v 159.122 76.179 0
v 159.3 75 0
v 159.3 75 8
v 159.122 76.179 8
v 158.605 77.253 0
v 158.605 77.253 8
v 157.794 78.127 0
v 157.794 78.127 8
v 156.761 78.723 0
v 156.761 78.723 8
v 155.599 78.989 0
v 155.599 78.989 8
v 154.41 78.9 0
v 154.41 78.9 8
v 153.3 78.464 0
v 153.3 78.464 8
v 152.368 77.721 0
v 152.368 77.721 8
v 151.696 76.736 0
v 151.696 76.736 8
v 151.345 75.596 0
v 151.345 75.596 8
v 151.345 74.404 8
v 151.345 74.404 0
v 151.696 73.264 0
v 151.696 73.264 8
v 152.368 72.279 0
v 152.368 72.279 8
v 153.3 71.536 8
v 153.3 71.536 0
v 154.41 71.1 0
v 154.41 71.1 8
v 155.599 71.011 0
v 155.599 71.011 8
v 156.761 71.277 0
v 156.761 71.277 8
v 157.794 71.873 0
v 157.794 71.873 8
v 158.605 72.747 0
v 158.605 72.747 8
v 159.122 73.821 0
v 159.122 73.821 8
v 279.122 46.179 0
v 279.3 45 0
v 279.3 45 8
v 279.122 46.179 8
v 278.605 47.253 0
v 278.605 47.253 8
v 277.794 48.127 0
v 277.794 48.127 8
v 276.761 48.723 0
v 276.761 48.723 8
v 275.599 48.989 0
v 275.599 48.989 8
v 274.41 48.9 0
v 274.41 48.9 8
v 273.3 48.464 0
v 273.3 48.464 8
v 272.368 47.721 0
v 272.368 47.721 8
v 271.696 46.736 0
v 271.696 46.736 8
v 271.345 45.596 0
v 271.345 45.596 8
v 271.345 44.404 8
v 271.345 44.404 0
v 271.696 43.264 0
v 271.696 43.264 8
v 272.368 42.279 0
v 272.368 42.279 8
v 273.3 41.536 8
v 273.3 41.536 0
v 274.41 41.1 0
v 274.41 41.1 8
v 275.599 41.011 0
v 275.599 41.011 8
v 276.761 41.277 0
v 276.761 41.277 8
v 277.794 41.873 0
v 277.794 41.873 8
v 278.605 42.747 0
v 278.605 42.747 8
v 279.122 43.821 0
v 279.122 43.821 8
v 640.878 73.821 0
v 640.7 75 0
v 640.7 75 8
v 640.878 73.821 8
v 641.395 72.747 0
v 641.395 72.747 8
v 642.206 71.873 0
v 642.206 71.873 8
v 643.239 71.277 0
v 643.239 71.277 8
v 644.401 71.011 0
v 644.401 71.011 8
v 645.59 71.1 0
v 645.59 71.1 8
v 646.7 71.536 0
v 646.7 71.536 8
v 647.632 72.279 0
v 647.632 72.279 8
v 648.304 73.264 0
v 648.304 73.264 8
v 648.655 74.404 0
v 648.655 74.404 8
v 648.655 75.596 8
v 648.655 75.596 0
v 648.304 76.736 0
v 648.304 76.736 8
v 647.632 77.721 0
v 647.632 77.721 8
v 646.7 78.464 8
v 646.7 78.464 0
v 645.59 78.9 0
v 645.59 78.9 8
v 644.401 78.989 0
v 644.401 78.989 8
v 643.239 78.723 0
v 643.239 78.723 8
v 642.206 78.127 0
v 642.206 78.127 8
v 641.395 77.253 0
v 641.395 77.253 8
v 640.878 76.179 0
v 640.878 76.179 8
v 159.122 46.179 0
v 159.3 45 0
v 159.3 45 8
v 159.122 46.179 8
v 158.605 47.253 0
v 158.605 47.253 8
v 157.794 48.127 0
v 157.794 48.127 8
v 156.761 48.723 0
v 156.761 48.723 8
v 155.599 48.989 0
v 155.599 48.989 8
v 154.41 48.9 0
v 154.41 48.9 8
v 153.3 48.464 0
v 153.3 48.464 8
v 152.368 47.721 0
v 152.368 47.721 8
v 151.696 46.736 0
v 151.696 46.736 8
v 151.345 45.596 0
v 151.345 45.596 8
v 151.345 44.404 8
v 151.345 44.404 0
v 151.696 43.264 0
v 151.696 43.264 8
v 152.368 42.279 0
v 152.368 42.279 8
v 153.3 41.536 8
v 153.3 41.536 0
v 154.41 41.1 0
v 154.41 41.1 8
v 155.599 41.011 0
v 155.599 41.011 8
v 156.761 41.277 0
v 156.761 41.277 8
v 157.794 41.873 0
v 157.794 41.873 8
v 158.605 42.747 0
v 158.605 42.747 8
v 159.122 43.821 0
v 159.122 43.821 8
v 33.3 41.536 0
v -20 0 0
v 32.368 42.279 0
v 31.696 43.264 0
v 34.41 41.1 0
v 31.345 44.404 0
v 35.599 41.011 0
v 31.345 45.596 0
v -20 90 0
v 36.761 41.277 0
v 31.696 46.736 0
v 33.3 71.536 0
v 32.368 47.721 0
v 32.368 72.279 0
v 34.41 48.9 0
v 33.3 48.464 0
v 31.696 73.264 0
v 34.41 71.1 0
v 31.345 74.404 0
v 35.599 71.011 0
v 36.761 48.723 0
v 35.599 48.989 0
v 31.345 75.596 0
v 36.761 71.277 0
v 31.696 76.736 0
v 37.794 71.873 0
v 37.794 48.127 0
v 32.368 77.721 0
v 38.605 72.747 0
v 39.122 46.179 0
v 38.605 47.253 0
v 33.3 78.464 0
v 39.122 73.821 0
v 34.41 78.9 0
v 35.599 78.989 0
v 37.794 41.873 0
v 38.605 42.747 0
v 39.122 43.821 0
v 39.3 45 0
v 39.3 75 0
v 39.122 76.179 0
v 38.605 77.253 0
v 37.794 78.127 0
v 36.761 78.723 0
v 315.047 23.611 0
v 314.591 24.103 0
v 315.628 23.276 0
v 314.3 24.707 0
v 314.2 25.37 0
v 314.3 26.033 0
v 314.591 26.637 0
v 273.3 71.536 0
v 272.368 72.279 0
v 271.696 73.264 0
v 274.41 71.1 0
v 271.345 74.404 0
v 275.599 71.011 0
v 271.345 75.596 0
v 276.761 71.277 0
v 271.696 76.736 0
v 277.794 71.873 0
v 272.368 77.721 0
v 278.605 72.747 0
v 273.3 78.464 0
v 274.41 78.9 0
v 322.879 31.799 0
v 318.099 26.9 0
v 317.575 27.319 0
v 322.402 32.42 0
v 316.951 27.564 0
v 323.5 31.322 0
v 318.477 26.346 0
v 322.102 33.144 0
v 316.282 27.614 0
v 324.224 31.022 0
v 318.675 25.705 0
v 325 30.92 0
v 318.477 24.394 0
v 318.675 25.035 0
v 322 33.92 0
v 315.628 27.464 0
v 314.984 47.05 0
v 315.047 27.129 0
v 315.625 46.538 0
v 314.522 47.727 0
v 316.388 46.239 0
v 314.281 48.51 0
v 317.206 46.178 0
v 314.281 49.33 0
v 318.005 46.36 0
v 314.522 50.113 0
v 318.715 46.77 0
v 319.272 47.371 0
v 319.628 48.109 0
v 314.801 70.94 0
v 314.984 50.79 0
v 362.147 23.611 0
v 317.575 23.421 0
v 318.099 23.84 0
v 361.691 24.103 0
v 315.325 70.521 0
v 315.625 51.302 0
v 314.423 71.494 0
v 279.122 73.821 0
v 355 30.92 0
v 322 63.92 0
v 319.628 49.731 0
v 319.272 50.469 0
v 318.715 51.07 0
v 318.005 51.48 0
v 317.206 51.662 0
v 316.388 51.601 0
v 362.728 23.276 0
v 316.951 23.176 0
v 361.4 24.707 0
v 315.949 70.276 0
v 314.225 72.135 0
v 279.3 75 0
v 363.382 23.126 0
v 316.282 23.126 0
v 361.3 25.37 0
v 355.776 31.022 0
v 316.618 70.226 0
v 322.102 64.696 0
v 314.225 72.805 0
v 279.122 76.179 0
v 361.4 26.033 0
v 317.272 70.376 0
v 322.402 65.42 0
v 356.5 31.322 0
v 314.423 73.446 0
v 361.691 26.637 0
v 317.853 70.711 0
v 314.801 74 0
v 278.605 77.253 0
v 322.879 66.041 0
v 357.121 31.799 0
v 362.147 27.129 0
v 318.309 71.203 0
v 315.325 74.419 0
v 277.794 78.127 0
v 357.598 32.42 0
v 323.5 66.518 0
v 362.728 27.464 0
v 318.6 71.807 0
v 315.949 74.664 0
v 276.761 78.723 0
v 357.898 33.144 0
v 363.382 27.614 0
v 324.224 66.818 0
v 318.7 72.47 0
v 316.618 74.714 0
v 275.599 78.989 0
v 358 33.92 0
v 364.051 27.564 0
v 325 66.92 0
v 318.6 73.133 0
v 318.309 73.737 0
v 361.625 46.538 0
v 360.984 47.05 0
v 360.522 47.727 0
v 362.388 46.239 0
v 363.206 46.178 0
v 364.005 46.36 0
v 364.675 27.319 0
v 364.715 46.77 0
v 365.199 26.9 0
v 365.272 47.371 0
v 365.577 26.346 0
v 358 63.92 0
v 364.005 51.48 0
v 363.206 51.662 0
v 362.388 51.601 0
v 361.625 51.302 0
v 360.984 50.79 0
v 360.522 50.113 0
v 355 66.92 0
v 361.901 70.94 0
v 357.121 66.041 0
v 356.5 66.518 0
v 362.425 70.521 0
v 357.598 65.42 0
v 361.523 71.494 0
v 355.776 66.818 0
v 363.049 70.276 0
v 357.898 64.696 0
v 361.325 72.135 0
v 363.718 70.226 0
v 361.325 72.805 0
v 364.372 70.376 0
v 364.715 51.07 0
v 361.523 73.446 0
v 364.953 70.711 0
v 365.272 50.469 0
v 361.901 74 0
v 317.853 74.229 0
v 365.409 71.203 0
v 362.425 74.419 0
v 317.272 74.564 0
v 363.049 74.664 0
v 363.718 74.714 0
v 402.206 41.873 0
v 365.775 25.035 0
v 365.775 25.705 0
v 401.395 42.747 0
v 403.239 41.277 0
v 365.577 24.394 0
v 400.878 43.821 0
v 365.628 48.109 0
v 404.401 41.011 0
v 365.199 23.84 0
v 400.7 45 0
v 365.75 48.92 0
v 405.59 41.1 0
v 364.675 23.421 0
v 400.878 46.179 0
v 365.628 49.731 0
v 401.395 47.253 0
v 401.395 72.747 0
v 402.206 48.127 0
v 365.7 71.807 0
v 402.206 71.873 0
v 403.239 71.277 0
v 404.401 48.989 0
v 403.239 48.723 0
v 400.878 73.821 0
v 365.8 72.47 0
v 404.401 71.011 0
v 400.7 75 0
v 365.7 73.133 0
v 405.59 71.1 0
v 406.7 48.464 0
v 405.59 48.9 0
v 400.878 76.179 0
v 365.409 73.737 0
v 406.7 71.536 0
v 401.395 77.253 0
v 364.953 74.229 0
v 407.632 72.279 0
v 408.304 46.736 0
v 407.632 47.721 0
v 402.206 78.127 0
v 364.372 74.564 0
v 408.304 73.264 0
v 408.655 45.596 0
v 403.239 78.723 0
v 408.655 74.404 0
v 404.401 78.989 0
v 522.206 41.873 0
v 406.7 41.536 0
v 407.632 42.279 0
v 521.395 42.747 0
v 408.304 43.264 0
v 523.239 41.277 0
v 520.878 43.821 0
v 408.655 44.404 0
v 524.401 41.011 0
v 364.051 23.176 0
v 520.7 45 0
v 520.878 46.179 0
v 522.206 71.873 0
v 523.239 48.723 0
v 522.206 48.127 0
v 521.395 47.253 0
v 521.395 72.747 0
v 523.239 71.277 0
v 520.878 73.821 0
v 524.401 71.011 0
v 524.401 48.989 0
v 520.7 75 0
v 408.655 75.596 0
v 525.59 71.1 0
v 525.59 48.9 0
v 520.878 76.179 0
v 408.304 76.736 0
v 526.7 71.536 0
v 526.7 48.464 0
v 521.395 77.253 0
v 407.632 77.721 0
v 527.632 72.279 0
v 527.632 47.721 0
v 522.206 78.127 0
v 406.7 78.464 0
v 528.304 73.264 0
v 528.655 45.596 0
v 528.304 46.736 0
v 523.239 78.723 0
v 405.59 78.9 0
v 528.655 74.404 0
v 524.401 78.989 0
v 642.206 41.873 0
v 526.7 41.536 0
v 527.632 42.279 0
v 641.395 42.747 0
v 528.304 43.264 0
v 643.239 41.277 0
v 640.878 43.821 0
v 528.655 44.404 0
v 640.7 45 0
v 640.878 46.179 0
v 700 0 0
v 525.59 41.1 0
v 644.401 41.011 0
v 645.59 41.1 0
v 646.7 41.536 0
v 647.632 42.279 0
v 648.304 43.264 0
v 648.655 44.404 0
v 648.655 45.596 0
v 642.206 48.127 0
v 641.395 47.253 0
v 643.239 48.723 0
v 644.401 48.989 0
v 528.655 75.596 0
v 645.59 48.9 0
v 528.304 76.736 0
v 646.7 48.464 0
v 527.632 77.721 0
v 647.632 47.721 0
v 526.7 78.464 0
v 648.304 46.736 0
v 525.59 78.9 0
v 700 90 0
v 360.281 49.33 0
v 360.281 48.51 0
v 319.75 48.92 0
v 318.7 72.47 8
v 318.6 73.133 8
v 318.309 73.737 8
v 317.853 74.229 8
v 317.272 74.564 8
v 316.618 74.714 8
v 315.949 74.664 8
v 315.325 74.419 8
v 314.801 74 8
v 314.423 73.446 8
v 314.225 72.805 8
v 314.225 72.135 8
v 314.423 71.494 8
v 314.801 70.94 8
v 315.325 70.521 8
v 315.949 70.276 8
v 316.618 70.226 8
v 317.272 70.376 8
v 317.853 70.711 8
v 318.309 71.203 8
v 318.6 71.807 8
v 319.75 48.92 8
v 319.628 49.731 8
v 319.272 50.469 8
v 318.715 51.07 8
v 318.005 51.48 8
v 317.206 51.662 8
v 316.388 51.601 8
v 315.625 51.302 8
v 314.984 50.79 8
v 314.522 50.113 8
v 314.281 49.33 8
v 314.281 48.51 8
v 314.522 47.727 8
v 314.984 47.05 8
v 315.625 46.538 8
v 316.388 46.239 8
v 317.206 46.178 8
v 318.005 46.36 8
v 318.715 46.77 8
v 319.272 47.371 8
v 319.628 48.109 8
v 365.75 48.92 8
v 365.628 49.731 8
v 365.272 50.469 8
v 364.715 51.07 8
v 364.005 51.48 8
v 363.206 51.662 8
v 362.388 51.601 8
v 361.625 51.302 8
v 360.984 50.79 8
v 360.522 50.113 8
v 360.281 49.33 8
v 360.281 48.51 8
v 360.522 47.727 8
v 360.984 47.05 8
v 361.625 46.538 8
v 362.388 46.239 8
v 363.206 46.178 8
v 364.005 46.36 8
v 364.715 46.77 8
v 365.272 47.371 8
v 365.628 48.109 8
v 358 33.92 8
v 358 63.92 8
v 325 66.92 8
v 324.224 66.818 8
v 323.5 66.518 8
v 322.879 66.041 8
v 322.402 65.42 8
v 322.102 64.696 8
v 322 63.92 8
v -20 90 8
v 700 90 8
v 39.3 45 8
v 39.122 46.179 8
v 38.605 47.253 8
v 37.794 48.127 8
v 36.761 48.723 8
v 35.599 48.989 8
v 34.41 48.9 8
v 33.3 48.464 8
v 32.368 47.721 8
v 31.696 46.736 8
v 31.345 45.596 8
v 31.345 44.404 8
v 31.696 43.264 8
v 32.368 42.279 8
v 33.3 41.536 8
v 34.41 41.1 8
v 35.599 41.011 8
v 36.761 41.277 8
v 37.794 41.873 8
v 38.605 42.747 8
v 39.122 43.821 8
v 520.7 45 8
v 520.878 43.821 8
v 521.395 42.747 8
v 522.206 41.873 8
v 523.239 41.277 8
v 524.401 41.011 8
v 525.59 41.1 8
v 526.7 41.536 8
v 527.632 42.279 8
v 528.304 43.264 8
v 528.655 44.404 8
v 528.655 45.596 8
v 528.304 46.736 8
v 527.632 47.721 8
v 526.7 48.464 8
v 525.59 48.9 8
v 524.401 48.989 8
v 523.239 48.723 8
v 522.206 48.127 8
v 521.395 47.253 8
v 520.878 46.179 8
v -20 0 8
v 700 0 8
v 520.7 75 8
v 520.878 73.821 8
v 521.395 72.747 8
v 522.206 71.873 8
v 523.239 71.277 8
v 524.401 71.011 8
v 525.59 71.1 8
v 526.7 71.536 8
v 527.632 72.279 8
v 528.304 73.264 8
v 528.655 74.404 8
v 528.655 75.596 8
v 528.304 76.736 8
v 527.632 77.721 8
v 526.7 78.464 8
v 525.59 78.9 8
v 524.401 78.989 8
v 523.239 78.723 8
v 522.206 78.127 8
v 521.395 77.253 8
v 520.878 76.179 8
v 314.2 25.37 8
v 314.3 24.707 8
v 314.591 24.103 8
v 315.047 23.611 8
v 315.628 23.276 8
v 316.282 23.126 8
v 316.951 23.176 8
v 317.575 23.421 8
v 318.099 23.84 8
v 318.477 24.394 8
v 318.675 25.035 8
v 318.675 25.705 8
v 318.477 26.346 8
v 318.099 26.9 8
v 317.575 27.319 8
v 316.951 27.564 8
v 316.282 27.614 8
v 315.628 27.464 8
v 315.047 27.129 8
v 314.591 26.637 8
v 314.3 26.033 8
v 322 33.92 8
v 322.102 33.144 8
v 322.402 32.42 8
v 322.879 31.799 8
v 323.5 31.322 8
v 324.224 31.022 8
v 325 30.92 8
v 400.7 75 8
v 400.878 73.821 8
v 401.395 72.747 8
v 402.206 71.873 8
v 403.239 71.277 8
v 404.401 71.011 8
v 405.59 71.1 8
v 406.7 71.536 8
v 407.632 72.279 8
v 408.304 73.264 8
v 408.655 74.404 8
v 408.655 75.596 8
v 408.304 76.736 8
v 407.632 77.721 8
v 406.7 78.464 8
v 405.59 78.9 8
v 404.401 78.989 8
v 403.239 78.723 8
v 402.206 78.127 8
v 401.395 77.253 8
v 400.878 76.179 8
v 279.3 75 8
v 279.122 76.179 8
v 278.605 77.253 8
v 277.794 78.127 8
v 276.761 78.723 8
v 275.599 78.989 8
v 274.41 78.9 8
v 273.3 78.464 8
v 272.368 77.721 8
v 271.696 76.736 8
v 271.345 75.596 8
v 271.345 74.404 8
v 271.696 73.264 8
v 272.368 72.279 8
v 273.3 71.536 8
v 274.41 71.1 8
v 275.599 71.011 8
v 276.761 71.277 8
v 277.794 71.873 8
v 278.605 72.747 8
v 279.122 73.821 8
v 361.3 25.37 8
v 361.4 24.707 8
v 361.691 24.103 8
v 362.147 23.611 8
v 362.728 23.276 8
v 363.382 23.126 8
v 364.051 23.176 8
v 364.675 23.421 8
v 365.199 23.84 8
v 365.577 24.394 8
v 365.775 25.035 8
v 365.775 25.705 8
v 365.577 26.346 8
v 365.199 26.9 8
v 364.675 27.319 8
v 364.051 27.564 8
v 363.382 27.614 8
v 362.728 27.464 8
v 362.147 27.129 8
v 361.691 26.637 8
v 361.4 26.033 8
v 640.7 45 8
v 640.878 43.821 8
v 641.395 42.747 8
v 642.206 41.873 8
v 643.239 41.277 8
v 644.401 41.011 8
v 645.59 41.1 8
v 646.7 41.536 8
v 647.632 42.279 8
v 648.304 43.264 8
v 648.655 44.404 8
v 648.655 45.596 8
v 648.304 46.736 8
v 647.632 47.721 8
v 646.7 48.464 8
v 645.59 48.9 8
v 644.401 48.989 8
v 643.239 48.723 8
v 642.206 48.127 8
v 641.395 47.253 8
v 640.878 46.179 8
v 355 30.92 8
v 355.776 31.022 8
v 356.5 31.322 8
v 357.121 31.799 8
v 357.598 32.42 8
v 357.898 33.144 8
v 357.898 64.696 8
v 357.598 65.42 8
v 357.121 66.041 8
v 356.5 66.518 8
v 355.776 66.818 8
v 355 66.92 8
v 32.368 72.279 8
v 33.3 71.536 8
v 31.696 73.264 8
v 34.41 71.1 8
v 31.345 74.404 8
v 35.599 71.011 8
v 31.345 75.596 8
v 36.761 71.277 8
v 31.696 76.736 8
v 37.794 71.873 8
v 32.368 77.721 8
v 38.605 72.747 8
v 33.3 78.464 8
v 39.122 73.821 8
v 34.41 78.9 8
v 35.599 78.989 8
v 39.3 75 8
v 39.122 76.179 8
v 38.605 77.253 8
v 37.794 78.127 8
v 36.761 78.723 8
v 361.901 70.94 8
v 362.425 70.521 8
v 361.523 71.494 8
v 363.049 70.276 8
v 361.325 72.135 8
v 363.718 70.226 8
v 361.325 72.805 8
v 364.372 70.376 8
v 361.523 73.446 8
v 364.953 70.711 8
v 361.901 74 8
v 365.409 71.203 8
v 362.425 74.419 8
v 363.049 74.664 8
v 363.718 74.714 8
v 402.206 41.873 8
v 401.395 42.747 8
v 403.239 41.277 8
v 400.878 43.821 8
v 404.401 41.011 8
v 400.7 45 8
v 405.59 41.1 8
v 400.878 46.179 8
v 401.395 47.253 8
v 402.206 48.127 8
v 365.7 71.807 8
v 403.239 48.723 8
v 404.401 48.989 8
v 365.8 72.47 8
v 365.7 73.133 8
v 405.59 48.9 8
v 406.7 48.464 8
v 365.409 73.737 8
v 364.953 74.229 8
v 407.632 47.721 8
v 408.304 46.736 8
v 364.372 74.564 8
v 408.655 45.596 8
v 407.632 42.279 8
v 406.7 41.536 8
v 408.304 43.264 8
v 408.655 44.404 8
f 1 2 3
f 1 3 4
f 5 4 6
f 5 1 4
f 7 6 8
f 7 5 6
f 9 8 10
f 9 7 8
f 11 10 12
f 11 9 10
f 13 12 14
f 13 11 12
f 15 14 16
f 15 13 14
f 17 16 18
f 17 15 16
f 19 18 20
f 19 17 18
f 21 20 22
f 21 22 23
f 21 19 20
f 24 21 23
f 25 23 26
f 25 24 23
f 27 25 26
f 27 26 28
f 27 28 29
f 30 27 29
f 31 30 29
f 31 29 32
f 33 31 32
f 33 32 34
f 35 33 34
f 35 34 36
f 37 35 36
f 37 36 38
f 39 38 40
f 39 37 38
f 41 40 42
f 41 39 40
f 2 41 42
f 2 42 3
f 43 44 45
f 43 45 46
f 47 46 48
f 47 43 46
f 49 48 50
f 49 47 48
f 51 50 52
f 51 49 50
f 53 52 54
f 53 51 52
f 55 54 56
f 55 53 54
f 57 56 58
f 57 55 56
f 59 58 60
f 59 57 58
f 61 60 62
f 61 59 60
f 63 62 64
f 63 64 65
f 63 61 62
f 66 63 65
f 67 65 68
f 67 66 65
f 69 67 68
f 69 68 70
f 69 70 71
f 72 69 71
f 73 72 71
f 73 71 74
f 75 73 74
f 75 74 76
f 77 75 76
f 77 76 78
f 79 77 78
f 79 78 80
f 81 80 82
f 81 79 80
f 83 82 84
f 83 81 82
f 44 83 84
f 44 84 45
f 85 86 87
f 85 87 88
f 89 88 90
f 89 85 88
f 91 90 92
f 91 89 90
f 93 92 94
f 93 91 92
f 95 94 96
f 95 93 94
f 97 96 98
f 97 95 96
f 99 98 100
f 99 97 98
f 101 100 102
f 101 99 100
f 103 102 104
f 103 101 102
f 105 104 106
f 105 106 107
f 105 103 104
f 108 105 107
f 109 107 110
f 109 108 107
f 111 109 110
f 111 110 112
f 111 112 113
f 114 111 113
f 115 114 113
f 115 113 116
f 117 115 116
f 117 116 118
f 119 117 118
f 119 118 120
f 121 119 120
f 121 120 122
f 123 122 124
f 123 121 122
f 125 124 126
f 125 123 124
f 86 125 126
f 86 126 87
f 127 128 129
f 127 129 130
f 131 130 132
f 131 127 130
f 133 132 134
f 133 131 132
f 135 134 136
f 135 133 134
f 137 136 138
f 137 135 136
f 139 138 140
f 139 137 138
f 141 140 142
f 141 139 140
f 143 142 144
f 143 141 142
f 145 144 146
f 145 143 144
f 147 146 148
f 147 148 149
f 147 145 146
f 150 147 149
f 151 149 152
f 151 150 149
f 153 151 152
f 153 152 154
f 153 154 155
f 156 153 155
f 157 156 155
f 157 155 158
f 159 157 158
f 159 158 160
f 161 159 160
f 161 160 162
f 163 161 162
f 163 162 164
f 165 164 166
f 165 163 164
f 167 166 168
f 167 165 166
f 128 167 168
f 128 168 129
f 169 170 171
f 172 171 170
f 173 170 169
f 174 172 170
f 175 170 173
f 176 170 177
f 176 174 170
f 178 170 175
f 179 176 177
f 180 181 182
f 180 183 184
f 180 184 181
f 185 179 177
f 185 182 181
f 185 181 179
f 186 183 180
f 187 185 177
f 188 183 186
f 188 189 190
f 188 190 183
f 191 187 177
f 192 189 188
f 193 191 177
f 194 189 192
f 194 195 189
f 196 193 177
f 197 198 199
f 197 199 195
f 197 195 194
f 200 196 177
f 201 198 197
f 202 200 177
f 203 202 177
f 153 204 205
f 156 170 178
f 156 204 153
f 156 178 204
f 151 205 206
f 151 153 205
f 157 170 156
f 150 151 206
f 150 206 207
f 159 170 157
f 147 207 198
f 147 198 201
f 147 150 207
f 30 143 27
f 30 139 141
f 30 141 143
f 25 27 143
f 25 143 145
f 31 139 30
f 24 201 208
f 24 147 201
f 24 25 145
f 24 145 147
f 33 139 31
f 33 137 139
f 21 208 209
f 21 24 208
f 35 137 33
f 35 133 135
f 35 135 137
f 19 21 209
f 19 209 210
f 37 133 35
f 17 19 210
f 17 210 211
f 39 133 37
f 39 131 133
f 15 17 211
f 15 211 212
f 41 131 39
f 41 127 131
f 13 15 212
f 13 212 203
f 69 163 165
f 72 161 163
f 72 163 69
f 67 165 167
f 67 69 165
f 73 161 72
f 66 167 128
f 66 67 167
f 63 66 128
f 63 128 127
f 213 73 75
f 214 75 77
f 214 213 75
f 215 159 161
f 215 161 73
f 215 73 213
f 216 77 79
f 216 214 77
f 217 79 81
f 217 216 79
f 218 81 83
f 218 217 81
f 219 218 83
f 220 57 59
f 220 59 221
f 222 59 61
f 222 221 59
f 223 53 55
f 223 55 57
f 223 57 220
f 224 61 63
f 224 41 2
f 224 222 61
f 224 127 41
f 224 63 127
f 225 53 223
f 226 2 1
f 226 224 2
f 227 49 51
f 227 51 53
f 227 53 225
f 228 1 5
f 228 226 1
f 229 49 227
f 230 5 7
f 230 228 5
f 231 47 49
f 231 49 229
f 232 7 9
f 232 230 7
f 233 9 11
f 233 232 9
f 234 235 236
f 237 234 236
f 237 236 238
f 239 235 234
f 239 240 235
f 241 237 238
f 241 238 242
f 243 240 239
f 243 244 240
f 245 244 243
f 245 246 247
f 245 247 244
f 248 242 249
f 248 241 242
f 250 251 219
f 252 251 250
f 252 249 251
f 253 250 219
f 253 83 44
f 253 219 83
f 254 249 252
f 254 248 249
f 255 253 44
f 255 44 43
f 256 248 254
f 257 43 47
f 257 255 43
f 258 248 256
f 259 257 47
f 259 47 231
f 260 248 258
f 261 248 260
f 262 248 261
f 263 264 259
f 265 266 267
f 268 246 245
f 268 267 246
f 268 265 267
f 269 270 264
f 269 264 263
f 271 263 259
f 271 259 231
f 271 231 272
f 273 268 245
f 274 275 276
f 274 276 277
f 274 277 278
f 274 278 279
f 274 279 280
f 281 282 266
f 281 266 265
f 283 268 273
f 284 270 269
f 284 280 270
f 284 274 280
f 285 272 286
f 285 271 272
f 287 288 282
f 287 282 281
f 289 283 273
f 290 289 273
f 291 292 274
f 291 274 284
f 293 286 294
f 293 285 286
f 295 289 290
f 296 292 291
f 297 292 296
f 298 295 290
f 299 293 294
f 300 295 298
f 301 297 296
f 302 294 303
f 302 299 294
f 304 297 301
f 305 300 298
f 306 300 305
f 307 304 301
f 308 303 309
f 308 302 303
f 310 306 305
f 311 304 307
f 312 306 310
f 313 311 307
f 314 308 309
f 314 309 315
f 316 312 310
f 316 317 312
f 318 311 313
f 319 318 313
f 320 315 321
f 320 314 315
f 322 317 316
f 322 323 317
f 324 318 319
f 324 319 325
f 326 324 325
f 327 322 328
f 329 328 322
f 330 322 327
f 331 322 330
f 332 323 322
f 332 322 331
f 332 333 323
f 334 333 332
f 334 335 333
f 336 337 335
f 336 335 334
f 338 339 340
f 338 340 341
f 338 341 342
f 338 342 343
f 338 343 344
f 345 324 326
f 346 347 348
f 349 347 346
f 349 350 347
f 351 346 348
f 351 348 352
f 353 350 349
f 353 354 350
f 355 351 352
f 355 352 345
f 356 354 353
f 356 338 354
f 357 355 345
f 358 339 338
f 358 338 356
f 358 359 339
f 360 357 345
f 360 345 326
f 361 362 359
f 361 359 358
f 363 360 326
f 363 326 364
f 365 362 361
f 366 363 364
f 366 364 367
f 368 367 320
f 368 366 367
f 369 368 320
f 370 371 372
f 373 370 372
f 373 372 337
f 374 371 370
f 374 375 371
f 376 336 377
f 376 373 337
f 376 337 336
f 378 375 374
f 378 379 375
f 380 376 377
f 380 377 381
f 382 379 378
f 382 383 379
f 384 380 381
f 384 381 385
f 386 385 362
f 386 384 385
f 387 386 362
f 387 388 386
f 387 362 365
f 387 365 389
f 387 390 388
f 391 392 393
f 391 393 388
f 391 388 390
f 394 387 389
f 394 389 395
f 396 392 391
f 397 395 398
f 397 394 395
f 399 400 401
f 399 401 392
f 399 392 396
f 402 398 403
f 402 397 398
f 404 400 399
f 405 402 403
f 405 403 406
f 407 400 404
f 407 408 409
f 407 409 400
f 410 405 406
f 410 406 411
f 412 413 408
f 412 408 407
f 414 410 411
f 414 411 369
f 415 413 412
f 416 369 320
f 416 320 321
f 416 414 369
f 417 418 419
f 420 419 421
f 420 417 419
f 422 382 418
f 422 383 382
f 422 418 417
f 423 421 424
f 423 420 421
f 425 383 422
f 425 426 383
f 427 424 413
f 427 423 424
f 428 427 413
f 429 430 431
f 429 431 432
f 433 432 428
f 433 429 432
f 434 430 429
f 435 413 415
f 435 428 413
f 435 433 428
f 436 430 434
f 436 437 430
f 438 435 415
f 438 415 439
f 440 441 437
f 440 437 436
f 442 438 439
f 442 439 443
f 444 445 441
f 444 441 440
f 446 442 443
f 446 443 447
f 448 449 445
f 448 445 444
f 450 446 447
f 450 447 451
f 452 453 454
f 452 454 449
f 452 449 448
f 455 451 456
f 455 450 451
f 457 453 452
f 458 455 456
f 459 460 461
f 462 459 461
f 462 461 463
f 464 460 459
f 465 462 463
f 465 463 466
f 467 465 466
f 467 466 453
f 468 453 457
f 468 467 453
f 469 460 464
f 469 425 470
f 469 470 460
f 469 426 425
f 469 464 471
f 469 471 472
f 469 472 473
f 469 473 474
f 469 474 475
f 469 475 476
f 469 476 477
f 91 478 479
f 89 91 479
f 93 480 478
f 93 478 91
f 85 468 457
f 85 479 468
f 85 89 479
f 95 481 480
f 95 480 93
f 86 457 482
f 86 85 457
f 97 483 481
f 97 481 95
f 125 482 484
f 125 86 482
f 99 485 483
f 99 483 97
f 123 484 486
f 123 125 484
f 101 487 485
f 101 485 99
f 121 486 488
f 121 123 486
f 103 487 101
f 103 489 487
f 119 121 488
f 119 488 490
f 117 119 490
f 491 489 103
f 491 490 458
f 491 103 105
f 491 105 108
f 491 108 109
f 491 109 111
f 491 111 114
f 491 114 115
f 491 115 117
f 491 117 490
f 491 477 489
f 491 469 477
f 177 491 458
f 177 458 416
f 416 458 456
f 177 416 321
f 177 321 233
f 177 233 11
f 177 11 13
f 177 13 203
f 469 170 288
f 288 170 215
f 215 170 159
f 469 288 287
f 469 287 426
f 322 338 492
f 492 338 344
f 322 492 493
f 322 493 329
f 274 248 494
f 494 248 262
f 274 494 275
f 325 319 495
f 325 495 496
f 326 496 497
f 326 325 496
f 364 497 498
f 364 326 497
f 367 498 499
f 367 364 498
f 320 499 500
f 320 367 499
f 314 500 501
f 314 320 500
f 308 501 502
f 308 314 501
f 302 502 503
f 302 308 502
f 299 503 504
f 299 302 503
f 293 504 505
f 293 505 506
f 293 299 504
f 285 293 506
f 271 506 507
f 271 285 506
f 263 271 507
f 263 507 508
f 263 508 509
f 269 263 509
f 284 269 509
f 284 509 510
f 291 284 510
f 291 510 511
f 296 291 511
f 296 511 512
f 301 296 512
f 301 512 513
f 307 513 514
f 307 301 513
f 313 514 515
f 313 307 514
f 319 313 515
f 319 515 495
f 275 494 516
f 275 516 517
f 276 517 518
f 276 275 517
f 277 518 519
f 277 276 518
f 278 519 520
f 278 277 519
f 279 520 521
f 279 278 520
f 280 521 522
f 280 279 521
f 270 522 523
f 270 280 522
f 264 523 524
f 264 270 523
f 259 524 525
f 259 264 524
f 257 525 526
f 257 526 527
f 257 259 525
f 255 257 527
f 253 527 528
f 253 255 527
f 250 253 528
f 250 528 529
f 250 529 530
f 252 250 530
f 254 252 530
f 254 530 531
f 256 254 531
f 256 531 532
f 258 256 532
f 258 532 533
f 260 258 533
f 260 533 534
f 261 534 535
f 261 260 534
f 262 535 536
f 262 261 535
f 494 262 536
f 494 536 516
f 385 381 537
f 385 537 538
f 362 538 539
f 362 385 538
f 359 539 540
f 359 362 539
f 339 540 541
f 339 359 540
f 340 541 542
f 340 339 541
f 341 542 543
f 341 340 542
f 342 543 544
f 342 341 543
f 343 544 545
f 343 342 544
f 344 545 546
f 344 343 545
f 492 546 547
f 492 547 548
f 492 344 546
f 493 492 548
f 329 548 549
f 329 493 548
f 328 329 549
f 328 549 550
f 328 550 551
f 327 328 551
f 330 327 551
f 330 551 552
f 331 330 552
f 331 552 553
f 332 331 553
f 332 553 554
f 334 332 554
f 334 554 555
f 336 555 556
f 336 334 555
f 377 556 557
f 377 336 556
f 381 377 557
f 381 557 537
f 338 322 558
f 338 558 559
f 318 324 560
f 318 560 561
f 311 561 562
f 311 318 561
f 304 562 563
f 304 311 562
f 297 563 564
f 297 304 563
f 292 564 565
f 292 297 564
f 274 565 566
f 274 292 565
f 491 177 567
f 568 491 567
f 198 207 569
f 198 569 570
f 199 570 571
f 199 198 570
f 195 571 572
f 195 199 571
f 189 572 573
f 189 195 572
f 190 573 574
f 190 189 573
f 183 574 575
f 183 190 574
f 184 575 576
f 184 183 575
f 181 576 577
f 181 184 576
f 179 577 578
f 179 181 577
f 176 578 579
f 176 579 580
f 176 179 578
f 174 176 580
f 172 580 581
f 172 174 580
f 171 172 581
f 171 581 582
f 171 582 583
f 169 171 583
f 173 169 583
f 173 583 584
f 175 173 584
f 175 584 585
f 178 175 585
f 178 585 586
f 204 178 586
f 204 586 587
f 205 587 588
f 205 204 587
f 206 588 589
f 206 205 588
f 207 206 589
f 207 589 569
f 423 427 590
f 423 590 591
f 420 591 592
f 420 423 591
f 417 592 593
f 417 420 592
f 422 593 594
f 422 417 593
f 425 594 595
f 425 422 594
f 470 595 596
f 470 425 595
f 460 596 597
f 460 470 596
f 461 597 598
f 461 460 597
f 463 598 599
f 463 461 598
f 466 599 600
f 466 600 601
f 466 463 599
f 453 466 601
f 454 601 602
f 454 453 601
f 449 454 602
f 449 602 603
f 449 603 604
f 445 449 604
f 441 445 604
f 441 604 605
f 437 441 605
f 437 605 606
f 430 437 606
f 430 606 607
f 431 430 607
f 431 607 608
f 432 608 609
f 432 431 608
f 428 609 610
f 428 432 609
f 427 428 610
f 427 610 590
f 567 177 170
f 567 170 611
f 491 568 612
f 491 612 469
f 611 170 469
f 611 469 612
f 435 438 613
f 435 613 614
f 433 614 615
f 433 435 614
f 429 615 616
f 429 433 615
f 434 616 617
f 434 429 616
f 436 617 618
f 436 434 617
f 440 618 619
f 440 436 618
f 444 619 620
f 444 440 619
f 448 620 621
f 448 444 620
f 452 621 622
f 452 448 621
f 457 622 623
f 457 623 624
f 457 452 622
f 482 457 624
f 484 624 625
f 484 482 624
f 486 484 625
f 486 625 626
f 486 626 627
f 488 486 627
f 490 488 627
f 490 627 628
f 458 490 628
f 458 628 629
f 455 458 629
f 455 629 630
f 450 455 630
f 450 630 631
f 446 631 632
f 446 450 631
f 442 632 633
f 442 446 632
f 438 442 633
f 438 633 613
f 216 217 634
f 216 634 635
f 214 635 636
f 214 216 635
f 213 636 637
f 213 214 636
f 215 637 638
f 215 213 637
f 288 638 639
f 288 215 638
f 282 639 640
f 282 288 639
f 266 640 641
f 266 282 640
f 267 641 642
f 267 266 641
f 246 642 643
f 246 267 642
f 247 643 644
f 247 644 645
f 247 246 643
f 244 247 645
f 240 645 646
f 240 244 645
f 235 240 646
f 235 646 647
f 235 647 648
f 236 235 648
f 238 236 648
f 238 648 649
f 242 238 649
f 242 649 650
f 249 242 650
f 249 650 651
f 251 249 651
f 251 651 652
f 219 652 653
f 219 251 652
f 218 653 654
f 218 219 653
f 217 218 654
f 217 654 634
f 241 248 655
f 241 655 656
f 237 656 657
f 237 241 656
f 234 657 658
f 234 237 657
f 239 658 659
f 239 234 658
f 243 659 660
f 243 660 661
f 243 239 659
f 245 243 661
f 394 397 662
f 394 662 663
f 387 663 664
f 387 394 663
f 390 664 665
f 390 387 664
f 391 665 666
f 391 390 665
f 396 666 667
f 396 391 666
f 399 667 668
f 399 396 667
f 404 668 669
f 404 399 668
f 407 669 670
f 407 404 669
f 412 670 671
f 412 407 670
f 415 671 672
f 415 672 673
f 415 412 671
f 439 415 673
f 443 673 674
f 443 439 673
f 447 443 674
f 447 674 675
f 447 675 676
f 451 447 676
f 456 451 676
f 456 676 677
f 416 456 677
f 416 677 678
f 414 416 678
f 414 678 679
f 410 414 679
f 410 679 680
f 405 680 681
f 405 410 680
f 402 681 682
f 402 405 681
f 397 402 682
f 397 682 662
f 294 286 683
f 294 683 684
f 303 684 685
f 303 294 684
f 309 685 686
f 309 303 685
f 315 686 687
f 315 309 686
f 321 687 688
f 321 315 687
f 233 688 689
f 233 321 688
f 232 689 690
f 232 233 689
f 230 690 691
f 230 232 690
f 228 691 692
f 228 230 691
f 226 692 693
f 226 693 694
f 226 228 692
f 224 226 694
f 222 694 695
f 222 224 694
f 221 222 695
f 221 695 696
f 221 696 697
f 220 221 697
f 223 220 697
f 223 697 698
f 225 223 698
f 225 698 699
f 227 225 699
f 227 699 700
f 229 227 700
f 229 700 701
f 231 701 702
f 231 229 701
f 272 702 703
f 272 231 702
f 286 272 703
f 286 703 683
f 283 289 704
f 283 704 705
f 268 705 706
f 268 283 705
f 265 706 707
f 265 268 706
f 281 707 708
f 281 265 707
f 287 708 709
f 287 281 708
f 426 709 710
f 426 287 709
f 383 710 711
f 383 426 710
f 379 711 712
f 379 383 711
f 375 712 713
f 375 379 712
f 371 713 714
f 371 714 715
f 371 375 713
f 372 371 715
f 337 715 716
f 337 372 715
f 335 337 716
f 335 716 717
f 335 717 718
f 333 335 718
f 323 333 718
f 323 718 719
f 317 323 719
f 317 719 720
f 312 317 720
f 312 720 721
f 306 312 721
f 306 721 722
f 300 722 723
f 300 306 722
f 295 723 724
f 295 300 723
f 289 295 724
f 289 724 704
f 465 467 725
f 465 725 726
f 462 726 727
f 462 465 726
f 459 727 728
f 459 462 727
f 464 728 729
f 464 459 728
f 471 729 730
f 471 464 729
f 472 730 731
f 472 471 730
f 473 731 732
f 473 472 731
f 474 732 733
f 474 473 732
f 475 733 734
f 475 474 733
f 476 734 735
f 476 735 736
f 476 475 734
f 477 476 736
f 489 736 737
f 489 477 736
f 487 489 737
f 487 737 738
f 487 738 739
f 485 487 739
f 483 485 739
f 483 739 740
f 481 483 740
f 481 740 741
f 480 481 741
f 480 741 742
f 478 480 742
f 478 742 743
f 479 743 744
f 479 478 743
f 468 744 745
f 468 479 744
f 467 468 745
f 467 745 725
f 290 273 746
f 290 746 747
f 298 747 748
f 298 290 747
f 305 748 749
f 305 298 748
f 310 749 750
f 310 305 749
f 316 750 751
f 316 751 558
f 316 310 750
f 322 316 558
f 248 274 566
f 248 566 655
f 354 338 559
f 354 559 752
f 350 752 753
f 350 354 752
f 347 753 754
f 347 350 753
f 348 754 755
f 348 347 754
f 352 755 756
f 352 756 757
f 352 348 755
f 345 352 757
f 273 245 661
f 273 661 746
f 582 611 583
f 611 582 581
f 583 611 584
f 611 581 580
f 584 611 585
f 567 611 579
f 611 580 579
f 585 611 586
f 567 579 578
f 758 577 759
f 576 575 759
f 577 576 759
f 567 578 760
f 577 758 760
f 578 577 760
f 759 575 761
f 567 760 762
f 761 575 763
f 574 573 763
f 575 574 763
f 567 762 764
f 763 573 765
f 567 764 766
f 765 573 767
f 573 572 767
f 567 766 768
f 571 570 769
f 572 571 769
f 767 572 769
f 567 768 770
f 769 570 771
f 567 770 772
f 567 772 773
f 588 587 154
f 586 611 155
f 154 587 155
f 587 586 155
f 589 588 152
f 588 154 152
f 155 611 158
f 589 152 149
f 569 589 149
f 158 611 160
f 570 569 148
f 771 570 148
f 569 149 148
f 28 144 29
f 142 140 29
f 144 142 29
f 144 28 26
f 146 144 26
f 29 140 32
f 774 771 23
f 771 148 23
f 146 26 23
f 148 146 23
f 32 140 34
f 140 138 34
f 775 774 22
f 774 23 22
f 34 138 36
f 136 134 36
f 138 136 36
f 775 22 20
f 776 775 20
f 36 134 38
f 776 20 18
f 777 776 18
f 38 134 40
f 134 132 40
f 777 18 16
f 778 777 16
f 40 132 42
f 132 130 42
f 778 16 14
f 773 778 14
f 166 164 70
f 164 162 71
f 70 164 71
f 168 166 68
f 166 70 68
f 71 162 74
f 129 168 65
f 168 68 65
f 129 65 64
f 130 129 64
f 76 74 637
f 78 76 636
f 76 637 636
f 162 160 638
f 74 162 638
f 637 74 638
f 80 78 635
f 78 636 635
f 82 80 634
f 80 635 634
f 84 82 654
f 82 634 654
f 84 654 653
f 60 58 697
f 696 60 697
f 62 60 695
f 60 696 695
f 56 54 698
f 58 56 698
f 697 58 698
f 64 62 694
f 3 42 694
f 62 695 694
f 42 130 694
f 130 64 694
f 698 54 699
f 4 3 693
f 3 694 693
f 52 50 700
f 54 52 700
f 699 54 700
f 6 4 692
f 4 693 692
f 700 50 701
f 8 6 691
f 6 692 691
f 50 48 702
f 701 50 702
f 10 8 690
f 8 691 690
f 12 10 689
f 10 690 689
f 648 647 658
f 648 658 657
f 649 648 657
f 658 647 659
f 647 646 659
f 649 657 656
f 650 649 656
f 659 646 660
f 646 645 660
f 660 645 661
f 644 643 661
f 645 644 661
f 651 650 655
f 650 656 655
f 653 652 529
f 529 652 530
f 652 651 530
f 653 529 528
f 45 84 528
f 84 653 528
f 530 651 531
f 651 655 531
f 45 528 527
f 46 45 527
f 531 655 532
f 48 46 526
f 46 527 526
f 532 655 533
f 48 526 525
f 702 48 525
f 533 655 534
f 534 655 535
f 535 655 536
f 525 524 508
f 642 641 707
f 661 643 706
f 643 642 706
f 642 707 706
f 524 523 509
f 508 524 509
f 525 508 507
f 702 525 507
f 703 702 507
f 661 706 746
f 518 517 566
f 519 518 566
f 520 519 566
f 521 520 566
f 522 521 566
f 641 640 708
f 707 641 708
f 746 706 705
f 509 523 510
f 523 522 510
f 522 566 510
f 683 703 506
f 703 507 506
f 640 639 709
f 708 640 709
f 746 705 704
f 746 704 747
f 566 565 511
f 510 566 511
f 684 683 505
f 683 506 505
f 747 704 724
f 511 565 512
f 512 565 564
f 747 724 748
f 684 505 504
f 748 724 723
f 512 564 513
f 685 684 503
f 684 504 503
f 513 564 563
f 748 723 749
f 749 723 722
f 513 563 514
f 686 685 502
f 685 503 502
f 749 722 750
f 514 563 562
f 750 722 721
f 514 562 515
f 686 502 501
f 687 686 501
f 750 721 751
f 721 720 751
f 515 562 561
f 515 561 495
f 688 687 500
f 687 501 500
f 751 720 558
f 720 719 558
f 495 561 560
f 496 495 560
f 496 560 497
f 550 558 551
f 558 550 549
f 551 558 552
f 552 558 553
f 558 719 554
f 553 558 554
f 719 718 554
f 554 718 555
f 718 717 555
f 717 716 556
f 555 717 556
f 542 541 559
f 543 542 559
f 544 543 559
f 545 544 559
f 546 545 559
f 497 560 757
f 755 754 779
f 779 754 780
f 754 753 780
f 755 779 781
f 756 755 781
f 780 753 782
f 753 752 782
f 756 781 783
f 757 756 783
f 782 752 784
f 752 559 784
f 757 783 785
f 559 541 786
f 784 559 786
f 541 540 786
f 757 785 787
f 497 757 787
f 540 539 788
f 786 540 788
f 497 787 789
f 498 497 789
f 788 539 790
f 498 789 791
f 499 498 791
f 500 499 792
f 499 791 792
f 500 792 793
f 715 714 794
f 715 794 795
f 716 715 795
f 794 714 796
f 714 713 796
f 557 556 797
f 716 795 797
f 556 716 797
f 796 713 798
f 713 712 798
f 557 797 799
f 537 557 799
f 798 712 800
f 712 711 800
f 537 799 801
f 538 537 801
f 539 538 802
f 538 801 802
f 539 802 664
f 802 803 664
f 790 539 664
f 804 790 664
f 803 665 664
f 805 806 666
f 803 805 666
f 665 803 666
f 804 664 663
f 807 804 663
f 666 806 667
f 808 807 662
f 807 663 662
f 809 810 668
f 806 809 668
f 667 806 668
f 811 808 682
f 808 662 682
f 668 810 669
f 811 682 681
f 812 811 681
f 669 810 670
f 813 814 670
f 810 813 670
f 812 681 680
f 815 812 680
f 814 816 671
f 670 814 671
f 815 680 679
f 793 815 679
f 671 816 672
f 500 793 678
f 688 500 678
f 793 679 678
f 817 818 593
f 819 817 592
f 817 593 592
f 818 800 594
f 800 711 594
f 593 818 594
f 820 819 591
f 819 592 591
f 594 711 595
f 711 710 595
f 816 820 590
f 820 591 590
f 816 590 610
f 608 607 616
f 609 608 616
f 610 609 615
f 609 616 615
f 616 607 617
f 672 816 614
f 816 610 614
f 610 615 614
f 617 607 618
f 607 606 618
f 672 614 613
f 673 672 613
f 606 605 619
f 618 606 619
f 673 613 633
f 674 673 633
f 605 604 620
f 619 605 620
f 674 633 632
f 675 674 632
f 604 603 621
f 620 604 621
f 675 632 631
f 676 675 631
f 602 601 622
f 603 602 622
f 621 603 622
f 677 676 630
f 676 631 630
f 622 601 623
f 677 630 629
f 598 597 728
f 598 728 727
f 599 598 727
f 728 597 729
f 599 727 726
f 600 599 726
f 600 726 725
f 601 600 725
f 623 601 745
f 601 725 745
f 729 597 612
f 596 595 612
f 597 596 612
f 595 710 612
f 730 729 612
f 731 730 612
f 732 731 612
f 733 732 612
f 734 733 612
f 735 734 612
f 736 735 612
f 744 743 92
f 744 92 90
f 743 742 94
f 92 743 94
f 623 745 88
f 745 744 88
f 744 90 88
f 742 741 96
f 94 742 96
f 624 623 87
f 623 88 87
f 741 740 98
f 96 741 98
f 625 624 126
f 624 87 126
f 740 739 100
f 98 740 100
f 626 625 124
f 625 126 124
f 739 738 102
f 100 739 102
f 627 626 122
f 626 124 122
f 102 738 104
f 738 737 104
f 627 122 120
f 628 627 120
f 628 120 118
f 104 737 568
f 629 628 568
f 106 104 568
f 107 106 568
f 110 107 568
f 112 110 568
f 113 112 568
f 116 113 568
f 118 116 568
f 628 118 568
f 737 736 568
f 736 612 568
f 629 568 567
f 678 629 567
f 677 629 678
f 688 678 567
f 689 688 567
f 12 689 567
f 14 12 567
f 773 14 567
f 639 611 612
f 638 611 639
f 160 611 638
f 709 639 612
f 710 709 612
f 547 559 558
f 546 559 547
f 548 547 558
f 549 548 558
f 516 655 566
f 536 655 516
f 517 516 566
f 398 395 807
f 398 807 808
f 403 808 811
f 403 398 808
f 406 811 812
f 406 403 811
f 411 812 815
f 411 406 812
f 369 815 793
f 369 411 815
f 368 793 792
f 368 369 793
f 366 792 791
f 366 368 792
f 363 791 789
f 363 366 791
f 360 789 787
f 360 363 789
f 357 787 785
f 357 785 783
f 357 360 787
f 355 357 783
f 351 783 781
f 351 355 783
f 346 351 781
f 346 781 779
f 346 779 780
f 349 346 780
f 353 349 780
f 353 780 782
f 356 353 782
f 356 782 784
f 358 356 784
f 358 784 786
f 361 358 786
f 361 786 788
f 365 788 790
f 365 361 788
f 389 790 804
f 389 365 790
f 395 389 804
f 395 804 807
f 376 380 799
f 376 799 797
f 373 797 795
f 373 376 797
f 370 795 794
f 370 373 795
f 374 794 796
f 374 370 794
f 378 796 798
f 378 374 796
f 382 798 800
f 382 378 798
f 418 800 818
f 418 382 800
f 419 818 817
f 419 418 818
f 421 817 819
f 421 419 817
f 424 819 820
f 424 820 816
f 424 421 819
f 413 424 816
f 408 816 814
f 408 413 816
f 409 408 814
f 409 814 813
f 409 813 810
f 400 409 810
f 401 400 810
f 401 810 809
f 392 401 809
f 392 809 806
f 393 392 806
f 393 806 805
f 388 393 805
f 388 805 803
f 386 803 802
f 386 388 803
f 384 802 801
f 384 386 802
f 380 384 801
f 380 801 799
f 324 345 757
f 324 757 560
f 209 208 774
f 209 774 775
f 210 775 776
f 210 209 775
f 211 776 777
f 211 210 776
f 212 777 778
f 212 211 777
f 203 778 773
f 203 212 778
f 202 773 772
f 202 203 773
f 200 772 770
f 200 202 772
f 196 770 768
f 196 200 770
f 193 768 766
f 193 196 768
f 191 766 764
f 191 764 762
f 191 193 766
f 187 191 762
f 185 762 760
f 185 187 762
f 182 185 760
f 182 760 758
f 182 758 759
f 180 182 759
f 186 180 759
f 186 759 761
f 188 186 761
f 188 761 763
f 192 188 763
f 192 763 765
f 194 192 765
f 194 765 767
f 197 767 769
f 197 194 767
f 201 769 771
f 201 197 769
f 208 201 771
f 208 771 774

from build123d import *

# Parameters (mm, degrees)
ESQUISSE1_W        = 680
ESQUISSE1_H        = 90
ESQUISSE1_R        = 2.75
ESQUISSE1_R_2      = 2.25
ESQUISSE1_R_3      = 4
BOSS_EXTRU_1_DEPTH = 8
ESQUISSE2_W        = 8
ESQUISSE2_H        = 90
BOSS_EXTRU_2_DEPTH = 20
ESQUISSE3_W        = 8
ESQUISSE3_H        = 90
BOSS_EXTRU_3_DEPTH = 20


with BuildPart() as part:
    # Esquisse1 → Boss.-Extru.1 (new body)
    with BuildSketch(Plane.XY):
        with Locations((340, 45)):
            Rectangle(ESQUISSE1_W, ESQUISSE1_H)
        with Locations((317, 48.92)):
            Circle(ESQUISSE1_R, mode=Mode.SUBTRACT)
        with Locations((363, 48.92)):
            Circle(ESQUISSE1_R, mode=Mode.SUBTRACT)
        with Locations((316.45, 72.47)):
            Circle(ESQUISSE1_R_2, mode=Mode.SUBTRACT)
        with Locations((363.55, 72.47)):
            Circle(ESQUISSE1_R_2, mode=Mode.SUBTRACT)
        with Locations(Location((363.55, 25.37, 0), (0, 0, 180))):
            Circle(ESQUISSE1_R_2, mode=Mode.SUBTRACT)
        with Locations(Location((316.45, 25.37, 0), (0, 0, 180))):
            Circle(ESQUISSE1_R_2, mode=Mode.SUBTRACT)
        with Locations((35.3, 75)):
            Circle(ESQUISSE1_R_3, mode=Mode.SUBTRACT)
        with Locations((35.3, 45)):
            Circle(ESQUISSE1_R_3, mode=Mode.SUBTRACT)
        with Locations(Location((644.7, 45, 0), (0, 0, 180))):
            Circle(ESQUISSE1_R_3, mode=Mode.SUBTRACT)
        with Locations(Location((644.7, 75, 0), (0, 0, 180))):
            Circle(ESQUISSE1_R_3, mode=Mode.SUBTRACT)
        with Locations((155.3, 75)):
            Circle(ESQUISSE1_R_3, mode=Mode.SUBTRACT)
        with Locations((155.3, 45)):
            Circle(ESQUISSE1_R_3, mode=Mode.SUBTRACT)
        with Locations((275.3, 75)):
            Circle(ESQUISSE1_R_3, mode=Mode.SUBTRACT)
        with Locations((275.3, 45)):
            Circle(ESQUISSE1_R_3, mode=Mode.SUBTRACT)
        with Locations(Location((404.7, 45, 0), (0, 0, 180))):
            Circle(ESQUISSE1_R_3, mode=Mode.SUBTRACT)
        with Locations(Location((404.7, 75, 0), (0, 0, 180))):
            Circle(ESQUISSE1_R_3, mode=Mode.SUBTRACT)
        with Locations(Location((524.7, 75, 0), (0, 0, 180))):
            Circle(ESQUISSE1_R_3, mode=Mode.SUBTRACT)
        with Locations(Location((524.7, 45, 0), (0, 0, 180))):
            Circle(ESQUISSE1_R_3, mode=Mode.SUBTRACT)
        with BuildLine():
            Line((340, 30.92), (355, 30.92))
            ThreePointArc((355, 30.92), (357.121320344, 31.798679656), (358, 33.92))
            Line((358, 33.92), (358, 63.92))
            ThreePointArc((358, 63.92), (357.121320344, 66.041320344), (355, 66.92))
            Line((355, 66.92), (325, 66.92))
            ThreePointArc((325, 66.92), (322.878679656, 66.041320344), (322, 63.92))
            Line((322, 63.92), (322, 33.92))
            ThreePointArc((322, 33.92), (322.878679656, 31.798679656), (325, 30.92))
            Line((325, 30.92), (340, 30.92))
        make_face(mode=Mode.SUBTRACT)
    extrude(amount=BOSS_EXTRU_1_DEPTH)

    # Esquisse2 → Boss.-Extru.2 (add)
    with BuildSketch(Plane(origin=(680, 0, 0), x_dir=(0, 0, -1), z_dir=(1, 0, 0))):
        with Locations((-4, 45)):
            Rectangle(ESQUISSE2_W, ESQUISSE2_H)
    extrude(amount=BOSS_EXTRU_2_DEPTH)

    # Esquisse3 → Boss.-Extru.3 (add)
    with BuildSketch(Plane.ZY):
        with Locations((4, 45)):
            Rectangle(ESQUISSE3_W, ESQUISSE3_H)
    extrude(amount=BOSS_EXTRU_3_DEPTH)


solid = part.part
